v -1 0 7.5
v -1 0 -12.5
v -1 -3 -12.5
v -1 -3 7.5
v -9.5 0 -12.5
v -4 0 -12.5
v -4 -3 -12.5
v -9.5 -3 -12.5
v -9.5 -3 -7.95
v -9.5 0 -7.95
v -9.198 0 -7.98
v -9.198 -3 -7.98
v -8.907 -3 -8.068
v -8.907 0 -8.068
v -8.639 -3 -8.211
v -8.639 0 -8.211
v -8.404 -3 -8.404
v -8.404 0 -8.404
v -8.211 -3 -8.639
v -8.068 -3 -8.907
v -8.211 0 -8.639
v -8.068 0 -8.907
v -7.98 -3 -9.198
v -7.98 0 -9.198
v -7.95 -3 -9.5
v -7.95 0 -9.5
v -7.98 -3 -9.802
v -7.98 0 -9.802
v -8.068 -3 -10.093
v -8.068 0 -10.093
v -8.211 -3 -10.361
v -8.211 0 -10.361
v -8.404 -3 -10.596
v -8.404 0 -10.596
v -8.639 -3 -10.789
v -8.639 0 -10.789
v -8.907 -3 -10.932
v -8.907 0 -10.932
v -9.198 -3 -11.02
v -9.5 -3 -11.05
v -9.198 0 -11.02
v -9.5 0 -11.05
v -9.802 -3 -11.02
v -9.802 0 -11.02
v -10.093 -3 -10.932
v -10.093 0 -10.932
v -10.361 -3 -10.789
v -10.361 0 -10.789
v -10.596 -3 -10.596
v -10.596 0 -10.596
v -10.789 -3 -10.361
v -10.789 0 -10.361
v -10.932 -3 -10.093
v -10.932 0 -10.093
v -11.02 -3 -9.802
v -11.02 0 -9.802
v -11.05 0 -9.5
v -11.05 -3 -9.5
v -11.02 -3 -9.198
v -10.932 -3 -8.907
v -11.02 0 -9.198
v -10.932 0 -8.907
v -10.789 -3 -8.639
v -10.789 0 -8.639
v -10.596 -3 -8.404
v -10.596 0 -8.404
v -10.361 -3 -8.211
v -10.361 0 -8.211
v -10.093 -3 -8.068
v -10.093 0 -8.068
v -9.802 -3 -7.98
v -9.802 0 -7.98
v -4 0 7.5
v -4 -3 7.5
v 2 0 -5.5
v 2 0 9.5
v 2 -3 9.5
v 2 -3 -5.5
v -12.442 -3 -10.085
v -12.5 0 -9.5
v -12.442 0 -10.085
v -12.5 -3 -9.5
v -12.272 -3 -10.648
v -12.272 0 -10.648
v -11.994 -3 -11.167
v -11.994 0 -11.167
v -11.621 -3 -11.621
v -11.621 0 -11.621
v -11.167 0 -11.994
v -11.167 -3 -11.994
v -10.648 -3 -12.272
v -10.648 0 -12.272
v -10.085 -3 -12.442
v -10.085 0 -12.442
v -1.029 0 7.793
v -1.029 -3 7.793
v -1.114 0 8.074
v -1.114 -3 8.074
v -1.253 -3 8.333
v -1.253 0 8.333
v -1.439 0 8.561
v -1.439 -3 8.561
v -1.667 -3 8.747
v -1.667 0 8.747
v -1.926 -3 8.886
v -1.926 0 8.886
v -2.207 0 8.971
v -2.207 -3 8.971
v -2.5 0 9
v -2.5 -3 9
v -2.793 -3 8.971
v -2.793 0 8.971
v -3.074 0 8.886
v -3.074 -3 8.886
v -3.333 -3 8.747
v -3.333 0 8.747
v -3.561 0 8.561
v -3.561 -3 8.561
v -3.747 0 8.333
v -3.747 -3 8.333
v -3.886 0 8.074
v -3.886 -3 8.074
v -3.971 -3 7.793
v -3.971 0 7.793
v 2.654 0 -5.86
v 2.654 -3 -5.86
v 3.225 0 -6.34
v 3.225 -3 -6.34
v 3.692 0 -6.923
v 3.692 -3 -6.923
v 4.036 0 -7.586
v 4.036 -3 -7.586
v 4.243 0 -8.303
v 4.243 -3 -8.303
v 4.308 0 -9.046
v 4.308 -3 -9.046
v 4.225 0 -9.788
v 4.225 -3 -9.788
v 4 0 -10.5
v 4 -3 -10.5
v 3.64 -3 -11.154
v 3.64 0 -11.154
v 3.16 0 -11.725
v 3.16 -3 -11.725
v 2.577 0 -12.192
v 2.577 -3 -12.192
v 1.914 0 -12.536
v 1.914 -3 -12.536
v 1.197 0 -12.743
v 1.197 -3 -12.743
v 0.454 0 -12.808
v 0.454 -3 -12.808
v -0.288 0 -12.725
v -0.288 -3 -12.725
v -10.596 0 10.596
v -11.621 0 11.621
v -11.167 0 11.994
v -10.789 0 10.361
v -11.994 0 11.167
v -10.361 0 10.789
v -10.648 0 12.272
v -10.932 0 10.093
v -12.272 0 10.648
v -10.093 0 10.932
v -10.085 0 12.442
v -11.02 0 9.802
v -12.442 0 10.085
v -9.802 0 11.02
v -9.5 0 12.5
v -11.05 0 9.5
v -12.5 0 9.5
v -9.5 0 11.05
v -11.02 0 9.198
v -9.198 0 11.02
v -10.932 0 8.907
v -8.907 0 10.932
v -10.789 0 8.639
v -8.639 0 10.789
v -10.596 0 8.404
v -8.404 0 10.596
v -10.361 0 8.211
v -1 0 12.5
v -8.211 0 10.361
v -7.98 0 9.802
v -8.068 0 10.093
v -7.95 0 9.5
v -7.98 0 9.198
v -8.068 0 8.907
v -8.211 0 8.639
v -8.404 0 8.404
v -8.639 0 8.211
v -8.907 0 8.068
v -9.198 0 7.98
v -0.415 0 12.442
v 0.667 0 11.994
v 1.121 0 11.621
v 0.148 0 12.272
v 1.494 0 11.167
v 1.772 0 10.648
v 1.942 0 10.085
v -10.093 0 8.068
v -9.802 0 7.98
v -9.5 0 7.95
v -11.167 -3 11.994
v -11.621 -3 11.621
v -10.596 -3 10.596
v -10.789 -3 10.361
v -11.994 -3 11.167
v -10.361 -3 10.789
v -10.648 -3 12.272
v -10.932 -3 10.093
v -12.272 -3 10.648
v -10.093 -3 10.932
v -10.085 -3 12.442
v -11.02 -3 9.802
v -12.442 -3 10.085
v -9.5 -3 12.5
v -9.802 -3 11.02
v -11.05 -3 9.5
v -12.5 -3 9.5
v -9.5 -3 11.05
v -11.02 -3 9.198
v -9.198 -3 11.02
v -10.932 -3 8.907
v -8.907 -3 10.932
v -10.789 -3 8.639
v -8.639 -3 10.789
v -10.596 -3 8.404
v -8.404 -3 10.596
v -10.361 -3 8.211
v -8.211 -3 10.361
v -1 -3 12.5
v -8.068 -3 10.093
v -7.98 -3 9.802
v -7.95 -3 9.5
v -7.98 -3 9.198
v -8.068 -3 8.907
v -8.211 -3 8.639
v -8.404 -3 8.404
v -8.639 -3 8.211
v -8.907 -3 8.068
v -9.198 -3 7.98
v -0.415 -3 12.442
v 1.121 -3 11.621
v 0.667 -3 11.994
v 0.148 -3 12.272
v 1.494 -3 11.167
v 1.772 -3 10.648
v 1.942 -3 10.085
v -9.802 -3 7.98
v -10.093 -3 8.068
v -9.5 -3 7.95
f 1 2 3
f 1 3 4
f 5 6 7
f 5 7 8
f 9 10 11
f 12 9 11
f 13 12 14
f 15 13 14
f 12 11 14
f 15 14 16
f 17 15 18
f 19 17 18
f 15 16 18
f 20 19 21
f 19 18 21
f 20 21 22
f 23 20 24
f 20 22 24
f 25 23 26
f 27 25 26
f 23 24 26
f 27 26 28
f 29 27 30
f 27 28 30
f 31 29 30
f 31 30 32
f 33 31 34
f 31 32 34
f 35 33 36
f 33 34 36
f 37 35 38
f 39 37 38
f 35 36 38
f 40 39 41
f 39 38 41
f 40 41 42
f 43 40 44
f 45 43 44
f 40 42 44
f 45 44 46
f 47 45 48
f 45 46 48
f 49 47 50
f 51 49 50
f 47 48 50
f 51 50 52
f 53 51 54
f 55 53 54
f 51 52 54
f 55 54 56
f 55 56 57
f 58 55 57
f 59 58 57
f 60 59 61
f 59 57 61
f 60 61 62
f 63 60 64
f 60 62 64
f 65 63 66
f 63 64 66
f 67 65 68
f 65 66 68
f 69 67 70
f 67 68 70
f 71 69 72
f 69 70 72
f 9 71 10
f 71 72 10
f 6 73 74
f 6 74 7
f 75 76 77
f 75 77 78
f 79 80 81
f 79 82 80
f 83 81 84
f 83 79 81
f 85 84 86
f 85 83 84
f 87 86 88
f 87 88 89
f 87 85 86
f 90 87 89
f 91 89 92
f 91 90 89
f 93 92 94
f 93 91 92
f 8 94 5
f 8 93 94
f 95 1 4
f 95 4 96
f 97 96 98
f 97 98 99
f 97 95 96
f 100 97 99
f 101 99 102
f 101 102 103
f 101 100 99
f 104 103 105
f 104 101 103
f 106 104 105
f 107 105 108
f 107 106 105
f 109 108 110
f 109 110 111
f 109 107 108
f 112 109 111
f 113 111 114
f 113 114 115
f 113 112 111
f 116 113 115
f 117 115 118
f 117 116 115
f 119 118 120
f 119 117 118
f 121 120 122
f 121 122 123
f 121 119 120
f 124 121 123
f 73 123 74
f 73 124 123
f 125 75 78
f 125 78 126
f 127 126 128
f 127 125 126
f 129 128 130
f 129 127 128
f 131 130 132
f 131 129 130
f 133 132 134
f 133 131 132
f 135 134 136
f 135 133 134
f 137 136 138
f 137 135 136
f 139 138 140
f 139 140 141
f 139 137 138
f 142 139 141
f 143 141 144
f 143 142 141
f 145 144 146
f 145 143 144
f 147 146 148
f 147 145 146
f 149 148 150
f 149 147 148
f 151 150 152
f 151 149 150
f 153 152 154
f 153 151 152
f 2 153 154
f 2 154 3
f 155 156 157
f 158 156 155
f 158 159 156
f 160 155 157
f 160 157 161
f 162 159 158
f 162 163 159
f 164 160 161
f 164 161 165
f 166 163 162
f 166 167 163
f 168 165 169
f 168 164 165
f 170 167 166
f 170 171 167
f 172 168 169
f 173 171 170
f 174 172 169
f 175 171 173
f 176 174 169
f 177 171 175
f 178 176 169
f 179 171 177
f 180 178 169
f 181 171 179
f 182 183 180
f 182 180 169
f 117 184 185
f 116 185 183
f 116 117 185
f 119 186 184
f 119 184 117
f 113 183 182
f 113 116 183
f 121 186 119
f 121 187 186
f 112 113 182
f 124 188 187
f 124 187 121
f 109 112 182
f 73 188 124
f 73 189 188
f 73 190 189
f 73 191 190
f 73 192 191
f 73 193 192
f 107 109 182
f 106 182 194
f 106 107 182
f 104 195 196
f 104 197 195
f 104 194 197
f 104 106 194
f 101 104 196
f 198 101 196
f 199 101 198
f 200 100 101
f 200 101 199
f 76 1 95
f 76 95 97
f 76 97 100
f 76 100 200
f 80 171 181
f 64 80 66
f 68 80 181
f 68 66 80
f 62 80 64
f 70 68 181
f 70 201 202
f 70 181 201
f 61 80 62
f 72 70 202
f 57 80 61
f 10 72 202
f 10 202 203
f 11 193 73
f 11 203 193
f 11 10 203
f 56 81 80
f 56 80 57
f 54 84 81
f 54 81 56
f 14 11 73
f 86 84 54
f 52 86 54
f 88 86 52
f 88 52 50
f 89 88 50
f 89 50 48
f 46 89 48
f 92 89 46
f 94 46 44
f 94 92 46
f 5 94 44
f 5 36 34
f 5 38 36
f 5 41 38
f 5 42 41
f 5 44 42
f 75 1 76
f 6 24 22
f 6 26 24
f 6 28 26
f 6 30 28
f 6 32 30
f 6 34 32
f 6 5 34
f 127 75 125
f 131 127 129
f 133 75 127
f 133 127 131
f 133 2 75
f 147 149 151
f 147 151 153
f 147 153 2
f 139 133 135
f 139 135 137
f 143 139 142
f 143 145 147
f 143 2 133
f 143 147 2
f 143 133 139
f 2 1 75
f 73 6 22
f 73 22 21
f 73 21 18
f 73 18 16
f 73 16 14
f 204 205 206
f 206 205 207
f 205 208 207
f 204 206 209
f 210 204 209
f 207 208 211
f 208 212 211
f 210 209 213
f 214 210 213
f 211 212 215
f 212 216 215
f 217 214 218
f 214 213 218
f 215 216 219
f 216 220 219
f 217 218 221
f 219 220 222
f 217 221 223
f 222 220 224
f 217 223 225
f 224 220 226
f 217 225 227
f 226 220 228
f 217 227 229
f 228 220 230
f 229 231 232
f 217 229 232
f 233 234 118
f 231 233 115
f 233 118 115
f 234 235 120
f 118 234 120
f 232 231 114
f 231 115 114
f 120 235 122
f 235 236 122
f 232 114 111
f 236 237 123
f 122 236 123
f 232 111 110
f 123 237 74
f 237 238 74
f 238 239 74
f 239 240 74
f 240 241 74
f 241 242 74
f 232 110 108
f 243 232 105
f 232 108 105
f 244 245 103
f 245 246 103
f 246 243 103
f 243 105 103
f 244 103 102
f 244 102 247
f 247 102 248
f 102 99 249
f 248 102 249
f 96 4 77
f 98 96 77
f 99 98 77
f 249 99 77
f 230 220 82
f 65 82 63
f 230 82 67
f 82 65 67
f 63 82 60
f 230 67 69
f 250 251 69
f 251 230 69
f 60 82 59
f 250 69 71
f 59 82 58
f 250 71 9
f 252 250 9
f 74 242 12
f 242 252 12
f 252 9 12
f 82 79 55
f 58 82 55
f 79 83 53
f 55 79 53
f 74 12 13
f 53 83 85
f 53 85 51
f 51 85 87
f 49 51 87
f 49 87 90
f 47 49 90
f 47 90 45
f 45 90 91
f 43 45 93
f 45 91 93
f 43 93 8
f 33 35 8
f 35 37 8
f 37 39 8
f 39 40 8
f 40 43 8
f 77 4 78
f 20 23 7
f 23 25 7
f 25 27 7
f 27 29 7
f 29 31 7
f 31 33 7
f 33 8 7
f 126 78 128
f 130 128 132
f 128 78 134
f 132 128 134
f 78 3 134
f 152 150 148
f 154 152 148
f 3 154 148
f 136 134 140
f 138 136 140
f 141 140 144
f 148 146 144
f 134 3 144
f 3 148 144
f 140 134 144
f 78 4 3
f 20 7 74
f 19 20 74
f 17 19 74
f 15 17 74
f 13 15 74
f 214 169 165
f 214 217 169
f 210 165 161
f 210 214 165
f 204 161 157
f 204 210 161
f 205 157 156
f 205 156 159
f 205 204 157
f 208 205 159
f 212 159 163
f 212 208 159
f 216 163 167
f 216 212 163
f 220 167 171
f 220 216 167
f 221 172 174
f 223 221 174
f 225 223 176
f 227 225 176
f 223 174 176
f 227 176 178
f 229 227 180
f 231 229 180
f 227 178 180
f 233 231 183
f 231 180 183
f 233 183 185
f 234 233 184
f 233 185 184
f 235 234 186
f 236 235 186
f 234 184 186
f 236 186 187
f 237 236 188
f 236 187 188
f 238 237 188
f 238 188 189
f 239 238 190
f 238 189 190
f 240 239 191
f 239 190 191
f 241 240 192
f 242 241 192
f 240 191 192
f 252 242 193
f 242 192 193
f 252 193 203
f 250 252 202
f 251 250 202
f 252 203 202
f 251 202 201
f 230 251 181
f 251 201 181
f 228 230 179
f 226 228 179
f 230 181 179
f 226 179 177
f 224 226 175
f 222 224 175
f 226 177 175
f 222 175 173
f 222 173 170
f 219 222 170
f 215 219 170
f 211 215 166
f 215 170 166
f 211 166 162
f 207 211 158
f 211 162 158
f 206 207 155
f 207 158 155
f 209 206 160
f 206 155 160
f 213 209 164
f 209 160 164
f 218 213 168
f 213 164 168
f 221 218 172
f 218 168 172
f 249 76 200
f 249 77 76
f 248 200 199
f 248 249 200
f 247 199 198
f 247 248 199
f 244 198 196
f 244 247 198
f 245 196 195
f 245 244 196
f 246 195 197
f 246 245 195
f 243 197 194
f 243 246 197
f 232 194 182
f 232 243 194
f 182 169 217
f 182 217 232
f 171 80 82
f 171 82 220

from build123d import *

# Parameters (mm, degrees)
SKETCH1_R           = 1.55
BOSS_EXTRUDE1_DEPTH = 3
FILLET1_R           = 3
FILLET3_R           = 3


with BuildPart() as part:
    # Sketch1 → Boss-Extrude1 (new body)
    with BuildSketch(Plane(origin=(0, 0, 0), x_dir=(1, 0, 0), z_dir=(0, 1, 0))):
        with BuildLine():
            Line((2, -7.5), (2, 5.5))
            ThreePointArc((2, 5.5), (4, 10.5), (-1, 12.5))
            Line((-1, 12.5), (-1, -7.5))
            ThreePointArc((-1, -7.5), (-2.5, -9), (-4, -7.5))
            Line((-4, -7.5), (-4, 12.5))
            Line((-4, 12.5), (-12.5, 12.5))
            Line((-12.5, 12.5), (-12.5, -12.5))
            Line((-12.5, -12.5), (2, -12.5))
            Line((2, -12.5), (2, -7.5))
        make_face()
        with Locations(Location((-9.5, 9.5, 0), (0, 0, 270))):
            Circle(SKETCH1_R, mode=Mode.SUBTRACT)
        with Locations(Location((-9.5, -9.5, 0), (0, 0, 270))):
            Circle(SKETCH1_R, mode=Mode.SUBTRACT)
    extrude(amount=-BOSS_EXTRUDE1_DEPTH)

    # Fillet1
    fillet1_edges = [part.edges().sort_by_distance(p)[0] for p in [
        (2, -1.5, 12.5),
    ]]
    fillet(fillet1_edges, radius=FILLET1_R)

    # Fillet3
    fillet3_edges = [part.edges().sort_by_distance(p)[0] for p in [
        (-12.5, -1.5, 12.5),
        (-12.5, -1.5, -12.5),
    ]]
    fillet(fillet3_edges, radius=FILLET3_R)


solid = part.part
